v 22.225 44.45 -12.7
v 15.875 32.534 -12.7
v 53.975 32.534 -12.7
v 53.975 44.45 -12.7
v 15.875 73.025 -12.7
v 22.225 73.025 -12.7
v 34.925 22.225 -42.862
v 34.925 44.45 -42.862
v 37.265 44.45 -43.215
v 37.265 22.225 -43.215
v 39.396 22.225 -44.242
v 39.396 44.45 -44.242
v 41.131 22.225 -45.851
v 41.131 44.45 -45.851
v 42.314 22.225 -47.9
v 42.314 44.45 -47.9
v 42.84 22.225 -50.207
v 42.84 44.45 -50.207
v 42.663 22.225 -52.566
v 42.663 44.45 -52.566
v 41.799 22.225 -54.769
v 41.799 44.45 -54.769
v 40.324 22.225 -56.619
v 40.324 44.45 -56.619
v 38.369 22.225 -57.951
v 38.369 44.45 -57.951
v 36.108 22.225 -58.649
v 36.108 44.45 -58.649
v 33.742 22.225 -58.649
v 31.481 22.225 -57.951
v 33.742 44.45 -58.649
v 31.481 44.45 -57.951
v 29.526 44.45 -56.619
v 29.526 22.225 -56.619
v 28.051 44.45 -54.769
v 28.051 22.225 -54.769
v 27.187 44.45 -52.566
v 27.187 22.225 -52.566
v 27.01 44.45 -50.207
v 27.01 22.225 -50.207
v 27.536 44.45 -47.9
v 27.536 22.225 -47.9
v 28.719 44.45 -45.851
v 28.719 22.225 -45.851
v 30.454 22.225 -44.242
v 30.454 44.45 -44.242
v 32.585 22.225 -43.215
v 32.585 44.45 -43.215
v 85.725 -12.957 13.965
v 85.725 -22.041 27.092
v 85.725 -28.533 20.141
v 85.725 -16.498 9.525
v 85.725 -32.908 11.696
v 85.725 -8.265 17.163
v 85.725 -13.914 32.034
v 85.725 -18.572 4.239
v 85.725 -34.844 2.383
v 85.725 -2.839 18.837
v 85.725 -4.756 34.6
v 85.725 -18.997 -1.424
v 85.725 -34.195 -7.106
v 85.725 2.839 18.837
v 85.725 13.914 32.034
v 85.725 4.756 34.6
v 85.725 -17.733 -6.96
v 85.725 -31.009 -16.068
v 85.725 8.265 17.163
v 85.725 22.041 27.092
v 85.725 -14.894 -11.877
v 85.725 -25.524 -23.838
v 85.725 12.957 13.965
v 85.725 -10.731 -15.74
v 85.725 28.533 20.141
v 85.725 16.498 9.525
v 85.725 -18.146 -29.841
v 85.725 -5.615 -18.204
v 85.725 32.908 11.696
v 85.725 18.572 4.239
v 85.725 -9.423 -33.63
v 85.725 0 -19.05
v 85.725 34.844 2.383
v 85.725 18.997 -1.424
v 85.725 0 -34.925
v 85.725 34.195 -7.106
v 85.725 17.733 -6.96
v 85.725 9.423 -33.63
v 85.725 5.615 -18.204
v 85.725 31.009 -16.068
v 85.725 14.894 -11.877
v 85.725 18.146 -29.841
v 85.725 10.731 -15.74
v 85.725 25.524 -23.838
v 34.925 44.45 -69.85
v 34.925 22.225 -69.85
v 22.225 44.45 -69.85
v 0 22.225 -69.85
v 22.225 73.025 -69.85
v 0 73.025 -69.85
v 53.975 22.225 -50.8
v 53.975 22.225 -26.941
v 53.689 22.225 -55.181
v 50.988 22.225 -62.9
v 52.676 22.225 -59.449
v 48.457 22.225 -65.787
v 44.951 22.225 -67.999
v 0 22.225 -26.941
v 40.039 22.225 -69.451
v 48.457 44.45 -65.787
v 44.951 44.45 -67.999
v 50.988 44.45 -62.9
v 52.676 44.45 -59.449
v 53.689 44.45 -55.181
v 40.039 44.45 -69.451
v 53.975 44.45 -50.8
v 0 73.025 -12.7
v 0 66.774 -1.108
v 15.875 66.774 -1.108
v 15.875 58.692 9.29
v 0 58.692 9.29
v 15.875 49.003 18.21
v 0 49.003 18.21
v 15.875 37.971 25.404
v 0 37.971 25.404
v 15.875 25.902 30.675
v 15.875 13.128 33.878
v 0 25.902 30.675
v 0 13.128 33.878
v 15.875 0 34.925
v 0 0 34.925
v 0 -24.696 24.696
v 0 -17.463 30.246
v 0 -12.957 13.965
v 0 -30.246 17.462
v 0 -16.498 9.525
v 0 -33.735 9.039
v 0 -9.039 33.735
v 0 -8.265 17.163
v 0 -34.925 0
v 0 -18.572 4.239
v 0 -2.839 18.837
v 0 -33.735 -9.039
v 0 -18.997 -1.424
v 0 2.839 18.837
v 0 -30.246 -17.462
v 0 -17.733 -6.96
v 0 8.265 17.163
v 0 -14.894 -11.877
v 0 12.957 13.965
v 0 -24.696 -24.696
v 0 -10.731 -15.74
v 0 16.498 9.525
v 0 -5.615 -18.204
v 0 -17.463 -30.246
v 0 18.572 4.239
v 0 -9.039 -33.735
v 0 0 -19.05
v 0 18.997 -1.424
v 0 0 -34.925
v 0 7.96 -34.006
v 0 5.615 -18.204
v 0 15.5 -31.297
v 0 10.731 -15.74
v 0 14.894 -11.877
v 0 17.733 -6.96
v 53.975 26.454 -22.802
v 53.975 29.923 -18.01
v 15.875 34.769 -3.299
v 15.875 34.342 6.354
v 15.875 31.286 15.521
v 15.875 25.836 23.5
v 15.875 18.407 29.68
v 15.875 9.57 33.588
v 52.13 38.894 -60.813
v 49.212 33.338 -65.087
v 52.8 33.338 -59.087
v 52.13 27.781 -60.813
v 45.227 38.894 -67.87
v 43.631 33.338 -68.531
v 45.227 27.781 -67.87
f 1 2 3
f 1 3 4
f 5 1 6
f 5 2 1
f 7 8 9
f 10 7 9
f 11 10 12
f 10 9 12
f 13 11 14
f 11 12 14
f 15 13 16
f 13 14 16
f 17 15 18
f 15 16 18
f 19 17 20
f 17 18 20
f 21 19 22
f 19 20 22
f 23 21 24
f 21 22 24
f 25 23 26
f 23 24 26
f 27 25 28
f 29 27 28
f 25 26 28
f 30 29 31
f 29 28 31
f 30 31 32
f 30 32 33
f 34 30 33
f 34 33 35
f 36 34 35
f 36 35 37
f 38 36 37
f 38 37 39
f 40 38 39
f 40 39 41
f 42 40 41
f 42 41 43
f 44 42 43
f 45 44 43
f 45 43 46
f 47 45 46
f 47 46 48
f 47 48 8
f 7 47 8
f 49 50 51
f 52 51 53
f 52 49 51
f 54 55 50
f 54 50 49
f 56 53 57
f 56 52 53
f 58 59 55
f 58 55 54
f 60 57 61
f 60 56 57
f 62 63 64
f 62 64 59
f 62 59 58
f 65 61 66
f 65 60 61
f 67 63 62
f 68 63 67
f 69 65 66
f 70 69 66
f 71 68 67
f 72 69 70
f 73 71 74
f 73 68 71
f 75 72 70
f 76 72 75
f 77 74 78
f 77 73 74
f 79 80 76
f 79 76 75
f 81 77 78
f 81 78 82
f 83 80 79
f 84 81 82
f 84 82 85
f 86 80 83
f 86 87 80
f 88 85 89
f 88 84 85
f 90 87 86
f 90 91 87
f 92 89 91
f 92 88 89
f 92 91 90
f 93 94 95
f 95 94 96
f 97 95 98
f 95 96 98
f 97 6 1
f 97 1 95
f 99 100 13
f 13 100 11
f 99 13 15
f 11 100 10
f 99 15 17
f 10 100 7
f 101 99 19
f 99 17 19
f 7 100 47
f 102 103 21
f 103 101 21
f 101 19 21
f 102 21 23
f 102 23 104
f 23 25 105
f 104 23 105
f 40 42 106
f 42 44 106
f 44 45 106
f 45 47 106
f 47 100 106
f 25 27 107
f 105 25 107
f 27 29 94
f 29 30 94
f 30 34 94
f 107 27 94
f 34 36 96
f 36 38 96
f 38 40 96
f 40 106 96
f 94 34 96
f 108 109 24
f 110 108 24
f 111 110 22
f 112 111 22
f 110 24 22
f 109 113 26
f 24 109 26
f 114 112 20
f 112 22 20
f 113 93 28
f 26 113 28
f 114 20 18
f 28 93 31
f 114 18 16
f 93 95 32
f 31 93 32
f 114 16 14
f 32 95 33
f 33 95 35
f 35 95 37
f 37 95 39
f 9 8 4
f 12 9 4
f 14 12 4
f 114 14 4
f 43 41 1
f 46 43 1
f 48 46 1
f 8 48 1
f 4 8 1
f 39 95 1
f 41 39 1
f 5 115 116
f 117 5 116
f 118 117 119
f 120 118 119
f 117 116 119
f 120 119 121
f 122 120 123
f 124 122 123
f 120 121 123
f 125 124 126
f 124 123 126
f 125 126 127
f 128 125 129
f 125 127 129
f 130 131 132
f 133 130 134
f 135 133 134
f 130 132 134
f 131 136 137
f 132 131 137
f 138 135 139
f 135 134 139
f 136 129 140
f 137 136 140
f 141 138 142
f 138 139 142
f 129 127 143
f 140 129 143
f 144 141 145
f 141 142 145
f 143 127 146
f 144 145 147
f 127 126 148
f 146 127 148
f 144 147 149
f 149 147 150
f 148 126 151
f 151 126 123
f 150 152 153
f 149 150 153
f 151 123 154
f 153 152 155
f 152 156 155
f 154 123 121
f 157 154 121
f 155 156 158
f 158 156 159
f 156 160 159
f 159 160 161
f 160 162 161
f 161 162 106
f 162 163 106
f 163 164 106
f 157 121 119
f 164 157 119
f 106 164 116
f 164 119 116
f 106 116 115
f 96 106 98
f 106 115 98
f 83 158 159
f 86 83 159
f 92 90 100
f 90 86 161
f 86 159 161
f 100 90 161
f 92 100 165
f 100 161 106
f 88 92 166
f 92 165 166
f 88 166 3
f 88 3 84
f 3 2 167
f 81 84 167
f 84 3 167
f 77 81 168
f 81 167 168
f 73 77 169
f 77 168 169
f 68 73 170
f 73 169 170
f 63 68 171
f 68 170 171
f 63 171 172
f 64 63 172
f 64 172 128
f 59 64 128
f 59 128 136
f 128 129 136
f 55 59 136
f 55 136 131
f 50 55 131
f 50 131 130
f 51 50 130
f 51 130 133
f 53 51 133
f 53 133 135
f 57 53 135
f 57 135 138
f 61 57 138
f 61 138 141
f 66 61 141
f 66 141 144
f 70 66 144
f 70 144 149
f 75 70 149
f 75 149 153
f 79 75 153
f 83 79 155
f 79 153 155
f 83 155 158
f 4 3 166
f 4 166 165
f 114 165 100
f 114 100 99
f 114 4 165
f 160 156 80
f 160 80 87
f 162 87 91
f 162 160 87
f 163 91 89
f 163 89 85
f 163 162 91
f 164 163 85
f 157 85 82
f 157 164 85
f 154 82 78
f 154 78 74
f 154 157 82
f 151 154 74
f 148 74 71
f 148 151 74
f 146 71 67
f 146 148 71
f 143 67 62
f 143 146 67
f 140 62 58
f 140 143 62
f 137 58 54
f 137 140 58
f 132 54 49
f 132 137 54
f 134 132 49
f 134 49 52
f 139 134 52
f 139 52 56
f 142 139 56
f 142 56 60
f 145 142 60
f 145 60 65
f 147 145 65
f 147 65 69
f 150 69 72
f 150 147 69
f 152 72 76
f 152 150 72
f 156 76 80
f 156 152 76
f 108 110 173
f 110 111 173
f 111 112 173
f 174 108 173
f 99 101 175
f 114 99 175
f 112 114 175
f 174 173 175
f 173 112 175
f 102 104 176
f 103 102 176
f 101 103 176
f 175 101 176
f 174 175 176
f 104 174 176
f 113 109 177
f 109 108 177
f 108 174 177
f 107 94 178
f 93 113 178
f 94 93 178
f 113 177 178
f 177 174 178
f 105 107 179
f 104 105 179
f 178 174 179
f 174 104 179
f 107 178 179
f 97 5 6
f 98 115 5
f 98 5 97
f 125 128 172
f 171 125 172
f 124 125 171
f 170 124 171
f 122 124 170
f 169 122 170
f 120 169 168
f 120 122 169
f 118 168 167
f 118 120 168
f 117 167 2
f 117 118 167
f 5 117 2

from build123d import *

# Parameters (mm, degrees)
SKETCH1_R           = 34.925
SKETCH1_R_2         = 19.05
BOSS_EXTRUDE1_DEPTH = 85.725
BOSS_EXTRUDE2_DEPTH = 53.975
SKETCH1_4_W         = 57.15
SKETCH1_4_H         = 28.575
BOSS_EXTRUDE3_DEPTH = 22.225
BOSS_EXTRUDE4_DEPTH = 15.875
FILLET1_SIZE        = 19.05
SKETCH2_R           = 7.9375
CUT_EXTRUDE1_DEPTH  = 137.118289601


with BuildPart() as part:
    # Sketch1 → Boss-Extrude1 (new body)
    with BuildSketch(Plane(origin=(0, 0, 0), x_dir=(0, 0, -1), z_dir=(1, 0, 0))):
        Circle(SKETCH1_R)
        Circle(SKETCH1_R_2, mode=Mode.SUBTRACT)
    extrude(amount=BOSS_EXTRUDE1_DEPTH)

    # Sketch1<3> → Boss-Extrude2 (add)
    with BuildSketch(Plane(origin=(0, 0, 0), x_dir=(0, 0, -1), z_dir=(1, 0, 0))):
        with BuildLine():
            Line((69.85, 44.45), (12.7, 44.45))
            Line((12.7, 44.45), (12.7, 32.534068682))
            ThreePointArc((12.7, 32.534068682), (20.479669269, 28.290259306), (26.940768363, 22.225))
            Line((26.940768363, 22.225), (69.85, 22.225))
            Line((69.85, 22.225), (69.85, 44.45))
        make_face()
    extrude(amount=BOSS_EXTRUDE2_DEPTH)

    # Sketch1<4> → Boss-Extrude3 (add)
    with BuildSketch(Plane(origin=(0, 0, 0), x_dir=(0, 0, -1), z_dir=(1, 0, 0))):
        with Locations((41.275, 58.7375)):
            Rectangle(SKETCH1_4_W, SKETCH1_4_H)
    extrude(amount=BOSS_EXTRUDE3_DEPTH)

    # Sketch1<5> → Boss-Extrude4 (add)
    with BuildSketch(Plane(origin=(0, 0, 0), x_dir=(0, 0, -1), z_dir=(1, 0, 0))):
        with BuildLine():
            Line((12.7, 32.534068682), (12.7, 44.45))
            Line((12.7, 44.45), (12.7, 73.025))
            ThreePointArc((12.7, 73.025), (-22.035822369, 43.636405893), (-34.925, 0))
            ThreePointArc((-34.925, 0), (-19.700356913, 28.838369623), (12.7, 32.534068682))
        make_face()
    extrude(amount=BOSS_EXTRUDE4_DEPTH)

    # Fillet1
    # a fillet whose section is not a circle: 19.05 mm, written as the material it takes off along each edge
    with BuildSketch(Plane(origin=(53.975, -25.4, -69.85), x_dir=(0, 0, 1), z_dir=(0, 1, 0))) as fillet1_piece_1:
        with BuildLine():
            Bezier((FILLET1_SIZE, 0), (0, 0), (0, -FILLET1_SIZE), weights=[1, 1, 1])
            Line((0, -FILLET1_SIZE), (0, 0))
            Line((0, 0), (FILLET1_SIZE, 0))
        make_face()
    extrude(amount=117.475, mode=Mode.SUBTRACT)

    # Sketch2 → Cut-Extrude1 (cut, through all)
    with BuildSketch(Plane(origin=(0, 44.45, 0), x_dir=(1, 0, 0), z_dir=(0, 1, 0))):
        with Locations(Location((34.925, 50.8, 0), (0, 0, 270))):
            Circle(SKETCH2_R)
    extrude(amount=-CUT_EXTRUDE1_DEPTH, mode=Mode.SUBTRACT)


solid = part.part
